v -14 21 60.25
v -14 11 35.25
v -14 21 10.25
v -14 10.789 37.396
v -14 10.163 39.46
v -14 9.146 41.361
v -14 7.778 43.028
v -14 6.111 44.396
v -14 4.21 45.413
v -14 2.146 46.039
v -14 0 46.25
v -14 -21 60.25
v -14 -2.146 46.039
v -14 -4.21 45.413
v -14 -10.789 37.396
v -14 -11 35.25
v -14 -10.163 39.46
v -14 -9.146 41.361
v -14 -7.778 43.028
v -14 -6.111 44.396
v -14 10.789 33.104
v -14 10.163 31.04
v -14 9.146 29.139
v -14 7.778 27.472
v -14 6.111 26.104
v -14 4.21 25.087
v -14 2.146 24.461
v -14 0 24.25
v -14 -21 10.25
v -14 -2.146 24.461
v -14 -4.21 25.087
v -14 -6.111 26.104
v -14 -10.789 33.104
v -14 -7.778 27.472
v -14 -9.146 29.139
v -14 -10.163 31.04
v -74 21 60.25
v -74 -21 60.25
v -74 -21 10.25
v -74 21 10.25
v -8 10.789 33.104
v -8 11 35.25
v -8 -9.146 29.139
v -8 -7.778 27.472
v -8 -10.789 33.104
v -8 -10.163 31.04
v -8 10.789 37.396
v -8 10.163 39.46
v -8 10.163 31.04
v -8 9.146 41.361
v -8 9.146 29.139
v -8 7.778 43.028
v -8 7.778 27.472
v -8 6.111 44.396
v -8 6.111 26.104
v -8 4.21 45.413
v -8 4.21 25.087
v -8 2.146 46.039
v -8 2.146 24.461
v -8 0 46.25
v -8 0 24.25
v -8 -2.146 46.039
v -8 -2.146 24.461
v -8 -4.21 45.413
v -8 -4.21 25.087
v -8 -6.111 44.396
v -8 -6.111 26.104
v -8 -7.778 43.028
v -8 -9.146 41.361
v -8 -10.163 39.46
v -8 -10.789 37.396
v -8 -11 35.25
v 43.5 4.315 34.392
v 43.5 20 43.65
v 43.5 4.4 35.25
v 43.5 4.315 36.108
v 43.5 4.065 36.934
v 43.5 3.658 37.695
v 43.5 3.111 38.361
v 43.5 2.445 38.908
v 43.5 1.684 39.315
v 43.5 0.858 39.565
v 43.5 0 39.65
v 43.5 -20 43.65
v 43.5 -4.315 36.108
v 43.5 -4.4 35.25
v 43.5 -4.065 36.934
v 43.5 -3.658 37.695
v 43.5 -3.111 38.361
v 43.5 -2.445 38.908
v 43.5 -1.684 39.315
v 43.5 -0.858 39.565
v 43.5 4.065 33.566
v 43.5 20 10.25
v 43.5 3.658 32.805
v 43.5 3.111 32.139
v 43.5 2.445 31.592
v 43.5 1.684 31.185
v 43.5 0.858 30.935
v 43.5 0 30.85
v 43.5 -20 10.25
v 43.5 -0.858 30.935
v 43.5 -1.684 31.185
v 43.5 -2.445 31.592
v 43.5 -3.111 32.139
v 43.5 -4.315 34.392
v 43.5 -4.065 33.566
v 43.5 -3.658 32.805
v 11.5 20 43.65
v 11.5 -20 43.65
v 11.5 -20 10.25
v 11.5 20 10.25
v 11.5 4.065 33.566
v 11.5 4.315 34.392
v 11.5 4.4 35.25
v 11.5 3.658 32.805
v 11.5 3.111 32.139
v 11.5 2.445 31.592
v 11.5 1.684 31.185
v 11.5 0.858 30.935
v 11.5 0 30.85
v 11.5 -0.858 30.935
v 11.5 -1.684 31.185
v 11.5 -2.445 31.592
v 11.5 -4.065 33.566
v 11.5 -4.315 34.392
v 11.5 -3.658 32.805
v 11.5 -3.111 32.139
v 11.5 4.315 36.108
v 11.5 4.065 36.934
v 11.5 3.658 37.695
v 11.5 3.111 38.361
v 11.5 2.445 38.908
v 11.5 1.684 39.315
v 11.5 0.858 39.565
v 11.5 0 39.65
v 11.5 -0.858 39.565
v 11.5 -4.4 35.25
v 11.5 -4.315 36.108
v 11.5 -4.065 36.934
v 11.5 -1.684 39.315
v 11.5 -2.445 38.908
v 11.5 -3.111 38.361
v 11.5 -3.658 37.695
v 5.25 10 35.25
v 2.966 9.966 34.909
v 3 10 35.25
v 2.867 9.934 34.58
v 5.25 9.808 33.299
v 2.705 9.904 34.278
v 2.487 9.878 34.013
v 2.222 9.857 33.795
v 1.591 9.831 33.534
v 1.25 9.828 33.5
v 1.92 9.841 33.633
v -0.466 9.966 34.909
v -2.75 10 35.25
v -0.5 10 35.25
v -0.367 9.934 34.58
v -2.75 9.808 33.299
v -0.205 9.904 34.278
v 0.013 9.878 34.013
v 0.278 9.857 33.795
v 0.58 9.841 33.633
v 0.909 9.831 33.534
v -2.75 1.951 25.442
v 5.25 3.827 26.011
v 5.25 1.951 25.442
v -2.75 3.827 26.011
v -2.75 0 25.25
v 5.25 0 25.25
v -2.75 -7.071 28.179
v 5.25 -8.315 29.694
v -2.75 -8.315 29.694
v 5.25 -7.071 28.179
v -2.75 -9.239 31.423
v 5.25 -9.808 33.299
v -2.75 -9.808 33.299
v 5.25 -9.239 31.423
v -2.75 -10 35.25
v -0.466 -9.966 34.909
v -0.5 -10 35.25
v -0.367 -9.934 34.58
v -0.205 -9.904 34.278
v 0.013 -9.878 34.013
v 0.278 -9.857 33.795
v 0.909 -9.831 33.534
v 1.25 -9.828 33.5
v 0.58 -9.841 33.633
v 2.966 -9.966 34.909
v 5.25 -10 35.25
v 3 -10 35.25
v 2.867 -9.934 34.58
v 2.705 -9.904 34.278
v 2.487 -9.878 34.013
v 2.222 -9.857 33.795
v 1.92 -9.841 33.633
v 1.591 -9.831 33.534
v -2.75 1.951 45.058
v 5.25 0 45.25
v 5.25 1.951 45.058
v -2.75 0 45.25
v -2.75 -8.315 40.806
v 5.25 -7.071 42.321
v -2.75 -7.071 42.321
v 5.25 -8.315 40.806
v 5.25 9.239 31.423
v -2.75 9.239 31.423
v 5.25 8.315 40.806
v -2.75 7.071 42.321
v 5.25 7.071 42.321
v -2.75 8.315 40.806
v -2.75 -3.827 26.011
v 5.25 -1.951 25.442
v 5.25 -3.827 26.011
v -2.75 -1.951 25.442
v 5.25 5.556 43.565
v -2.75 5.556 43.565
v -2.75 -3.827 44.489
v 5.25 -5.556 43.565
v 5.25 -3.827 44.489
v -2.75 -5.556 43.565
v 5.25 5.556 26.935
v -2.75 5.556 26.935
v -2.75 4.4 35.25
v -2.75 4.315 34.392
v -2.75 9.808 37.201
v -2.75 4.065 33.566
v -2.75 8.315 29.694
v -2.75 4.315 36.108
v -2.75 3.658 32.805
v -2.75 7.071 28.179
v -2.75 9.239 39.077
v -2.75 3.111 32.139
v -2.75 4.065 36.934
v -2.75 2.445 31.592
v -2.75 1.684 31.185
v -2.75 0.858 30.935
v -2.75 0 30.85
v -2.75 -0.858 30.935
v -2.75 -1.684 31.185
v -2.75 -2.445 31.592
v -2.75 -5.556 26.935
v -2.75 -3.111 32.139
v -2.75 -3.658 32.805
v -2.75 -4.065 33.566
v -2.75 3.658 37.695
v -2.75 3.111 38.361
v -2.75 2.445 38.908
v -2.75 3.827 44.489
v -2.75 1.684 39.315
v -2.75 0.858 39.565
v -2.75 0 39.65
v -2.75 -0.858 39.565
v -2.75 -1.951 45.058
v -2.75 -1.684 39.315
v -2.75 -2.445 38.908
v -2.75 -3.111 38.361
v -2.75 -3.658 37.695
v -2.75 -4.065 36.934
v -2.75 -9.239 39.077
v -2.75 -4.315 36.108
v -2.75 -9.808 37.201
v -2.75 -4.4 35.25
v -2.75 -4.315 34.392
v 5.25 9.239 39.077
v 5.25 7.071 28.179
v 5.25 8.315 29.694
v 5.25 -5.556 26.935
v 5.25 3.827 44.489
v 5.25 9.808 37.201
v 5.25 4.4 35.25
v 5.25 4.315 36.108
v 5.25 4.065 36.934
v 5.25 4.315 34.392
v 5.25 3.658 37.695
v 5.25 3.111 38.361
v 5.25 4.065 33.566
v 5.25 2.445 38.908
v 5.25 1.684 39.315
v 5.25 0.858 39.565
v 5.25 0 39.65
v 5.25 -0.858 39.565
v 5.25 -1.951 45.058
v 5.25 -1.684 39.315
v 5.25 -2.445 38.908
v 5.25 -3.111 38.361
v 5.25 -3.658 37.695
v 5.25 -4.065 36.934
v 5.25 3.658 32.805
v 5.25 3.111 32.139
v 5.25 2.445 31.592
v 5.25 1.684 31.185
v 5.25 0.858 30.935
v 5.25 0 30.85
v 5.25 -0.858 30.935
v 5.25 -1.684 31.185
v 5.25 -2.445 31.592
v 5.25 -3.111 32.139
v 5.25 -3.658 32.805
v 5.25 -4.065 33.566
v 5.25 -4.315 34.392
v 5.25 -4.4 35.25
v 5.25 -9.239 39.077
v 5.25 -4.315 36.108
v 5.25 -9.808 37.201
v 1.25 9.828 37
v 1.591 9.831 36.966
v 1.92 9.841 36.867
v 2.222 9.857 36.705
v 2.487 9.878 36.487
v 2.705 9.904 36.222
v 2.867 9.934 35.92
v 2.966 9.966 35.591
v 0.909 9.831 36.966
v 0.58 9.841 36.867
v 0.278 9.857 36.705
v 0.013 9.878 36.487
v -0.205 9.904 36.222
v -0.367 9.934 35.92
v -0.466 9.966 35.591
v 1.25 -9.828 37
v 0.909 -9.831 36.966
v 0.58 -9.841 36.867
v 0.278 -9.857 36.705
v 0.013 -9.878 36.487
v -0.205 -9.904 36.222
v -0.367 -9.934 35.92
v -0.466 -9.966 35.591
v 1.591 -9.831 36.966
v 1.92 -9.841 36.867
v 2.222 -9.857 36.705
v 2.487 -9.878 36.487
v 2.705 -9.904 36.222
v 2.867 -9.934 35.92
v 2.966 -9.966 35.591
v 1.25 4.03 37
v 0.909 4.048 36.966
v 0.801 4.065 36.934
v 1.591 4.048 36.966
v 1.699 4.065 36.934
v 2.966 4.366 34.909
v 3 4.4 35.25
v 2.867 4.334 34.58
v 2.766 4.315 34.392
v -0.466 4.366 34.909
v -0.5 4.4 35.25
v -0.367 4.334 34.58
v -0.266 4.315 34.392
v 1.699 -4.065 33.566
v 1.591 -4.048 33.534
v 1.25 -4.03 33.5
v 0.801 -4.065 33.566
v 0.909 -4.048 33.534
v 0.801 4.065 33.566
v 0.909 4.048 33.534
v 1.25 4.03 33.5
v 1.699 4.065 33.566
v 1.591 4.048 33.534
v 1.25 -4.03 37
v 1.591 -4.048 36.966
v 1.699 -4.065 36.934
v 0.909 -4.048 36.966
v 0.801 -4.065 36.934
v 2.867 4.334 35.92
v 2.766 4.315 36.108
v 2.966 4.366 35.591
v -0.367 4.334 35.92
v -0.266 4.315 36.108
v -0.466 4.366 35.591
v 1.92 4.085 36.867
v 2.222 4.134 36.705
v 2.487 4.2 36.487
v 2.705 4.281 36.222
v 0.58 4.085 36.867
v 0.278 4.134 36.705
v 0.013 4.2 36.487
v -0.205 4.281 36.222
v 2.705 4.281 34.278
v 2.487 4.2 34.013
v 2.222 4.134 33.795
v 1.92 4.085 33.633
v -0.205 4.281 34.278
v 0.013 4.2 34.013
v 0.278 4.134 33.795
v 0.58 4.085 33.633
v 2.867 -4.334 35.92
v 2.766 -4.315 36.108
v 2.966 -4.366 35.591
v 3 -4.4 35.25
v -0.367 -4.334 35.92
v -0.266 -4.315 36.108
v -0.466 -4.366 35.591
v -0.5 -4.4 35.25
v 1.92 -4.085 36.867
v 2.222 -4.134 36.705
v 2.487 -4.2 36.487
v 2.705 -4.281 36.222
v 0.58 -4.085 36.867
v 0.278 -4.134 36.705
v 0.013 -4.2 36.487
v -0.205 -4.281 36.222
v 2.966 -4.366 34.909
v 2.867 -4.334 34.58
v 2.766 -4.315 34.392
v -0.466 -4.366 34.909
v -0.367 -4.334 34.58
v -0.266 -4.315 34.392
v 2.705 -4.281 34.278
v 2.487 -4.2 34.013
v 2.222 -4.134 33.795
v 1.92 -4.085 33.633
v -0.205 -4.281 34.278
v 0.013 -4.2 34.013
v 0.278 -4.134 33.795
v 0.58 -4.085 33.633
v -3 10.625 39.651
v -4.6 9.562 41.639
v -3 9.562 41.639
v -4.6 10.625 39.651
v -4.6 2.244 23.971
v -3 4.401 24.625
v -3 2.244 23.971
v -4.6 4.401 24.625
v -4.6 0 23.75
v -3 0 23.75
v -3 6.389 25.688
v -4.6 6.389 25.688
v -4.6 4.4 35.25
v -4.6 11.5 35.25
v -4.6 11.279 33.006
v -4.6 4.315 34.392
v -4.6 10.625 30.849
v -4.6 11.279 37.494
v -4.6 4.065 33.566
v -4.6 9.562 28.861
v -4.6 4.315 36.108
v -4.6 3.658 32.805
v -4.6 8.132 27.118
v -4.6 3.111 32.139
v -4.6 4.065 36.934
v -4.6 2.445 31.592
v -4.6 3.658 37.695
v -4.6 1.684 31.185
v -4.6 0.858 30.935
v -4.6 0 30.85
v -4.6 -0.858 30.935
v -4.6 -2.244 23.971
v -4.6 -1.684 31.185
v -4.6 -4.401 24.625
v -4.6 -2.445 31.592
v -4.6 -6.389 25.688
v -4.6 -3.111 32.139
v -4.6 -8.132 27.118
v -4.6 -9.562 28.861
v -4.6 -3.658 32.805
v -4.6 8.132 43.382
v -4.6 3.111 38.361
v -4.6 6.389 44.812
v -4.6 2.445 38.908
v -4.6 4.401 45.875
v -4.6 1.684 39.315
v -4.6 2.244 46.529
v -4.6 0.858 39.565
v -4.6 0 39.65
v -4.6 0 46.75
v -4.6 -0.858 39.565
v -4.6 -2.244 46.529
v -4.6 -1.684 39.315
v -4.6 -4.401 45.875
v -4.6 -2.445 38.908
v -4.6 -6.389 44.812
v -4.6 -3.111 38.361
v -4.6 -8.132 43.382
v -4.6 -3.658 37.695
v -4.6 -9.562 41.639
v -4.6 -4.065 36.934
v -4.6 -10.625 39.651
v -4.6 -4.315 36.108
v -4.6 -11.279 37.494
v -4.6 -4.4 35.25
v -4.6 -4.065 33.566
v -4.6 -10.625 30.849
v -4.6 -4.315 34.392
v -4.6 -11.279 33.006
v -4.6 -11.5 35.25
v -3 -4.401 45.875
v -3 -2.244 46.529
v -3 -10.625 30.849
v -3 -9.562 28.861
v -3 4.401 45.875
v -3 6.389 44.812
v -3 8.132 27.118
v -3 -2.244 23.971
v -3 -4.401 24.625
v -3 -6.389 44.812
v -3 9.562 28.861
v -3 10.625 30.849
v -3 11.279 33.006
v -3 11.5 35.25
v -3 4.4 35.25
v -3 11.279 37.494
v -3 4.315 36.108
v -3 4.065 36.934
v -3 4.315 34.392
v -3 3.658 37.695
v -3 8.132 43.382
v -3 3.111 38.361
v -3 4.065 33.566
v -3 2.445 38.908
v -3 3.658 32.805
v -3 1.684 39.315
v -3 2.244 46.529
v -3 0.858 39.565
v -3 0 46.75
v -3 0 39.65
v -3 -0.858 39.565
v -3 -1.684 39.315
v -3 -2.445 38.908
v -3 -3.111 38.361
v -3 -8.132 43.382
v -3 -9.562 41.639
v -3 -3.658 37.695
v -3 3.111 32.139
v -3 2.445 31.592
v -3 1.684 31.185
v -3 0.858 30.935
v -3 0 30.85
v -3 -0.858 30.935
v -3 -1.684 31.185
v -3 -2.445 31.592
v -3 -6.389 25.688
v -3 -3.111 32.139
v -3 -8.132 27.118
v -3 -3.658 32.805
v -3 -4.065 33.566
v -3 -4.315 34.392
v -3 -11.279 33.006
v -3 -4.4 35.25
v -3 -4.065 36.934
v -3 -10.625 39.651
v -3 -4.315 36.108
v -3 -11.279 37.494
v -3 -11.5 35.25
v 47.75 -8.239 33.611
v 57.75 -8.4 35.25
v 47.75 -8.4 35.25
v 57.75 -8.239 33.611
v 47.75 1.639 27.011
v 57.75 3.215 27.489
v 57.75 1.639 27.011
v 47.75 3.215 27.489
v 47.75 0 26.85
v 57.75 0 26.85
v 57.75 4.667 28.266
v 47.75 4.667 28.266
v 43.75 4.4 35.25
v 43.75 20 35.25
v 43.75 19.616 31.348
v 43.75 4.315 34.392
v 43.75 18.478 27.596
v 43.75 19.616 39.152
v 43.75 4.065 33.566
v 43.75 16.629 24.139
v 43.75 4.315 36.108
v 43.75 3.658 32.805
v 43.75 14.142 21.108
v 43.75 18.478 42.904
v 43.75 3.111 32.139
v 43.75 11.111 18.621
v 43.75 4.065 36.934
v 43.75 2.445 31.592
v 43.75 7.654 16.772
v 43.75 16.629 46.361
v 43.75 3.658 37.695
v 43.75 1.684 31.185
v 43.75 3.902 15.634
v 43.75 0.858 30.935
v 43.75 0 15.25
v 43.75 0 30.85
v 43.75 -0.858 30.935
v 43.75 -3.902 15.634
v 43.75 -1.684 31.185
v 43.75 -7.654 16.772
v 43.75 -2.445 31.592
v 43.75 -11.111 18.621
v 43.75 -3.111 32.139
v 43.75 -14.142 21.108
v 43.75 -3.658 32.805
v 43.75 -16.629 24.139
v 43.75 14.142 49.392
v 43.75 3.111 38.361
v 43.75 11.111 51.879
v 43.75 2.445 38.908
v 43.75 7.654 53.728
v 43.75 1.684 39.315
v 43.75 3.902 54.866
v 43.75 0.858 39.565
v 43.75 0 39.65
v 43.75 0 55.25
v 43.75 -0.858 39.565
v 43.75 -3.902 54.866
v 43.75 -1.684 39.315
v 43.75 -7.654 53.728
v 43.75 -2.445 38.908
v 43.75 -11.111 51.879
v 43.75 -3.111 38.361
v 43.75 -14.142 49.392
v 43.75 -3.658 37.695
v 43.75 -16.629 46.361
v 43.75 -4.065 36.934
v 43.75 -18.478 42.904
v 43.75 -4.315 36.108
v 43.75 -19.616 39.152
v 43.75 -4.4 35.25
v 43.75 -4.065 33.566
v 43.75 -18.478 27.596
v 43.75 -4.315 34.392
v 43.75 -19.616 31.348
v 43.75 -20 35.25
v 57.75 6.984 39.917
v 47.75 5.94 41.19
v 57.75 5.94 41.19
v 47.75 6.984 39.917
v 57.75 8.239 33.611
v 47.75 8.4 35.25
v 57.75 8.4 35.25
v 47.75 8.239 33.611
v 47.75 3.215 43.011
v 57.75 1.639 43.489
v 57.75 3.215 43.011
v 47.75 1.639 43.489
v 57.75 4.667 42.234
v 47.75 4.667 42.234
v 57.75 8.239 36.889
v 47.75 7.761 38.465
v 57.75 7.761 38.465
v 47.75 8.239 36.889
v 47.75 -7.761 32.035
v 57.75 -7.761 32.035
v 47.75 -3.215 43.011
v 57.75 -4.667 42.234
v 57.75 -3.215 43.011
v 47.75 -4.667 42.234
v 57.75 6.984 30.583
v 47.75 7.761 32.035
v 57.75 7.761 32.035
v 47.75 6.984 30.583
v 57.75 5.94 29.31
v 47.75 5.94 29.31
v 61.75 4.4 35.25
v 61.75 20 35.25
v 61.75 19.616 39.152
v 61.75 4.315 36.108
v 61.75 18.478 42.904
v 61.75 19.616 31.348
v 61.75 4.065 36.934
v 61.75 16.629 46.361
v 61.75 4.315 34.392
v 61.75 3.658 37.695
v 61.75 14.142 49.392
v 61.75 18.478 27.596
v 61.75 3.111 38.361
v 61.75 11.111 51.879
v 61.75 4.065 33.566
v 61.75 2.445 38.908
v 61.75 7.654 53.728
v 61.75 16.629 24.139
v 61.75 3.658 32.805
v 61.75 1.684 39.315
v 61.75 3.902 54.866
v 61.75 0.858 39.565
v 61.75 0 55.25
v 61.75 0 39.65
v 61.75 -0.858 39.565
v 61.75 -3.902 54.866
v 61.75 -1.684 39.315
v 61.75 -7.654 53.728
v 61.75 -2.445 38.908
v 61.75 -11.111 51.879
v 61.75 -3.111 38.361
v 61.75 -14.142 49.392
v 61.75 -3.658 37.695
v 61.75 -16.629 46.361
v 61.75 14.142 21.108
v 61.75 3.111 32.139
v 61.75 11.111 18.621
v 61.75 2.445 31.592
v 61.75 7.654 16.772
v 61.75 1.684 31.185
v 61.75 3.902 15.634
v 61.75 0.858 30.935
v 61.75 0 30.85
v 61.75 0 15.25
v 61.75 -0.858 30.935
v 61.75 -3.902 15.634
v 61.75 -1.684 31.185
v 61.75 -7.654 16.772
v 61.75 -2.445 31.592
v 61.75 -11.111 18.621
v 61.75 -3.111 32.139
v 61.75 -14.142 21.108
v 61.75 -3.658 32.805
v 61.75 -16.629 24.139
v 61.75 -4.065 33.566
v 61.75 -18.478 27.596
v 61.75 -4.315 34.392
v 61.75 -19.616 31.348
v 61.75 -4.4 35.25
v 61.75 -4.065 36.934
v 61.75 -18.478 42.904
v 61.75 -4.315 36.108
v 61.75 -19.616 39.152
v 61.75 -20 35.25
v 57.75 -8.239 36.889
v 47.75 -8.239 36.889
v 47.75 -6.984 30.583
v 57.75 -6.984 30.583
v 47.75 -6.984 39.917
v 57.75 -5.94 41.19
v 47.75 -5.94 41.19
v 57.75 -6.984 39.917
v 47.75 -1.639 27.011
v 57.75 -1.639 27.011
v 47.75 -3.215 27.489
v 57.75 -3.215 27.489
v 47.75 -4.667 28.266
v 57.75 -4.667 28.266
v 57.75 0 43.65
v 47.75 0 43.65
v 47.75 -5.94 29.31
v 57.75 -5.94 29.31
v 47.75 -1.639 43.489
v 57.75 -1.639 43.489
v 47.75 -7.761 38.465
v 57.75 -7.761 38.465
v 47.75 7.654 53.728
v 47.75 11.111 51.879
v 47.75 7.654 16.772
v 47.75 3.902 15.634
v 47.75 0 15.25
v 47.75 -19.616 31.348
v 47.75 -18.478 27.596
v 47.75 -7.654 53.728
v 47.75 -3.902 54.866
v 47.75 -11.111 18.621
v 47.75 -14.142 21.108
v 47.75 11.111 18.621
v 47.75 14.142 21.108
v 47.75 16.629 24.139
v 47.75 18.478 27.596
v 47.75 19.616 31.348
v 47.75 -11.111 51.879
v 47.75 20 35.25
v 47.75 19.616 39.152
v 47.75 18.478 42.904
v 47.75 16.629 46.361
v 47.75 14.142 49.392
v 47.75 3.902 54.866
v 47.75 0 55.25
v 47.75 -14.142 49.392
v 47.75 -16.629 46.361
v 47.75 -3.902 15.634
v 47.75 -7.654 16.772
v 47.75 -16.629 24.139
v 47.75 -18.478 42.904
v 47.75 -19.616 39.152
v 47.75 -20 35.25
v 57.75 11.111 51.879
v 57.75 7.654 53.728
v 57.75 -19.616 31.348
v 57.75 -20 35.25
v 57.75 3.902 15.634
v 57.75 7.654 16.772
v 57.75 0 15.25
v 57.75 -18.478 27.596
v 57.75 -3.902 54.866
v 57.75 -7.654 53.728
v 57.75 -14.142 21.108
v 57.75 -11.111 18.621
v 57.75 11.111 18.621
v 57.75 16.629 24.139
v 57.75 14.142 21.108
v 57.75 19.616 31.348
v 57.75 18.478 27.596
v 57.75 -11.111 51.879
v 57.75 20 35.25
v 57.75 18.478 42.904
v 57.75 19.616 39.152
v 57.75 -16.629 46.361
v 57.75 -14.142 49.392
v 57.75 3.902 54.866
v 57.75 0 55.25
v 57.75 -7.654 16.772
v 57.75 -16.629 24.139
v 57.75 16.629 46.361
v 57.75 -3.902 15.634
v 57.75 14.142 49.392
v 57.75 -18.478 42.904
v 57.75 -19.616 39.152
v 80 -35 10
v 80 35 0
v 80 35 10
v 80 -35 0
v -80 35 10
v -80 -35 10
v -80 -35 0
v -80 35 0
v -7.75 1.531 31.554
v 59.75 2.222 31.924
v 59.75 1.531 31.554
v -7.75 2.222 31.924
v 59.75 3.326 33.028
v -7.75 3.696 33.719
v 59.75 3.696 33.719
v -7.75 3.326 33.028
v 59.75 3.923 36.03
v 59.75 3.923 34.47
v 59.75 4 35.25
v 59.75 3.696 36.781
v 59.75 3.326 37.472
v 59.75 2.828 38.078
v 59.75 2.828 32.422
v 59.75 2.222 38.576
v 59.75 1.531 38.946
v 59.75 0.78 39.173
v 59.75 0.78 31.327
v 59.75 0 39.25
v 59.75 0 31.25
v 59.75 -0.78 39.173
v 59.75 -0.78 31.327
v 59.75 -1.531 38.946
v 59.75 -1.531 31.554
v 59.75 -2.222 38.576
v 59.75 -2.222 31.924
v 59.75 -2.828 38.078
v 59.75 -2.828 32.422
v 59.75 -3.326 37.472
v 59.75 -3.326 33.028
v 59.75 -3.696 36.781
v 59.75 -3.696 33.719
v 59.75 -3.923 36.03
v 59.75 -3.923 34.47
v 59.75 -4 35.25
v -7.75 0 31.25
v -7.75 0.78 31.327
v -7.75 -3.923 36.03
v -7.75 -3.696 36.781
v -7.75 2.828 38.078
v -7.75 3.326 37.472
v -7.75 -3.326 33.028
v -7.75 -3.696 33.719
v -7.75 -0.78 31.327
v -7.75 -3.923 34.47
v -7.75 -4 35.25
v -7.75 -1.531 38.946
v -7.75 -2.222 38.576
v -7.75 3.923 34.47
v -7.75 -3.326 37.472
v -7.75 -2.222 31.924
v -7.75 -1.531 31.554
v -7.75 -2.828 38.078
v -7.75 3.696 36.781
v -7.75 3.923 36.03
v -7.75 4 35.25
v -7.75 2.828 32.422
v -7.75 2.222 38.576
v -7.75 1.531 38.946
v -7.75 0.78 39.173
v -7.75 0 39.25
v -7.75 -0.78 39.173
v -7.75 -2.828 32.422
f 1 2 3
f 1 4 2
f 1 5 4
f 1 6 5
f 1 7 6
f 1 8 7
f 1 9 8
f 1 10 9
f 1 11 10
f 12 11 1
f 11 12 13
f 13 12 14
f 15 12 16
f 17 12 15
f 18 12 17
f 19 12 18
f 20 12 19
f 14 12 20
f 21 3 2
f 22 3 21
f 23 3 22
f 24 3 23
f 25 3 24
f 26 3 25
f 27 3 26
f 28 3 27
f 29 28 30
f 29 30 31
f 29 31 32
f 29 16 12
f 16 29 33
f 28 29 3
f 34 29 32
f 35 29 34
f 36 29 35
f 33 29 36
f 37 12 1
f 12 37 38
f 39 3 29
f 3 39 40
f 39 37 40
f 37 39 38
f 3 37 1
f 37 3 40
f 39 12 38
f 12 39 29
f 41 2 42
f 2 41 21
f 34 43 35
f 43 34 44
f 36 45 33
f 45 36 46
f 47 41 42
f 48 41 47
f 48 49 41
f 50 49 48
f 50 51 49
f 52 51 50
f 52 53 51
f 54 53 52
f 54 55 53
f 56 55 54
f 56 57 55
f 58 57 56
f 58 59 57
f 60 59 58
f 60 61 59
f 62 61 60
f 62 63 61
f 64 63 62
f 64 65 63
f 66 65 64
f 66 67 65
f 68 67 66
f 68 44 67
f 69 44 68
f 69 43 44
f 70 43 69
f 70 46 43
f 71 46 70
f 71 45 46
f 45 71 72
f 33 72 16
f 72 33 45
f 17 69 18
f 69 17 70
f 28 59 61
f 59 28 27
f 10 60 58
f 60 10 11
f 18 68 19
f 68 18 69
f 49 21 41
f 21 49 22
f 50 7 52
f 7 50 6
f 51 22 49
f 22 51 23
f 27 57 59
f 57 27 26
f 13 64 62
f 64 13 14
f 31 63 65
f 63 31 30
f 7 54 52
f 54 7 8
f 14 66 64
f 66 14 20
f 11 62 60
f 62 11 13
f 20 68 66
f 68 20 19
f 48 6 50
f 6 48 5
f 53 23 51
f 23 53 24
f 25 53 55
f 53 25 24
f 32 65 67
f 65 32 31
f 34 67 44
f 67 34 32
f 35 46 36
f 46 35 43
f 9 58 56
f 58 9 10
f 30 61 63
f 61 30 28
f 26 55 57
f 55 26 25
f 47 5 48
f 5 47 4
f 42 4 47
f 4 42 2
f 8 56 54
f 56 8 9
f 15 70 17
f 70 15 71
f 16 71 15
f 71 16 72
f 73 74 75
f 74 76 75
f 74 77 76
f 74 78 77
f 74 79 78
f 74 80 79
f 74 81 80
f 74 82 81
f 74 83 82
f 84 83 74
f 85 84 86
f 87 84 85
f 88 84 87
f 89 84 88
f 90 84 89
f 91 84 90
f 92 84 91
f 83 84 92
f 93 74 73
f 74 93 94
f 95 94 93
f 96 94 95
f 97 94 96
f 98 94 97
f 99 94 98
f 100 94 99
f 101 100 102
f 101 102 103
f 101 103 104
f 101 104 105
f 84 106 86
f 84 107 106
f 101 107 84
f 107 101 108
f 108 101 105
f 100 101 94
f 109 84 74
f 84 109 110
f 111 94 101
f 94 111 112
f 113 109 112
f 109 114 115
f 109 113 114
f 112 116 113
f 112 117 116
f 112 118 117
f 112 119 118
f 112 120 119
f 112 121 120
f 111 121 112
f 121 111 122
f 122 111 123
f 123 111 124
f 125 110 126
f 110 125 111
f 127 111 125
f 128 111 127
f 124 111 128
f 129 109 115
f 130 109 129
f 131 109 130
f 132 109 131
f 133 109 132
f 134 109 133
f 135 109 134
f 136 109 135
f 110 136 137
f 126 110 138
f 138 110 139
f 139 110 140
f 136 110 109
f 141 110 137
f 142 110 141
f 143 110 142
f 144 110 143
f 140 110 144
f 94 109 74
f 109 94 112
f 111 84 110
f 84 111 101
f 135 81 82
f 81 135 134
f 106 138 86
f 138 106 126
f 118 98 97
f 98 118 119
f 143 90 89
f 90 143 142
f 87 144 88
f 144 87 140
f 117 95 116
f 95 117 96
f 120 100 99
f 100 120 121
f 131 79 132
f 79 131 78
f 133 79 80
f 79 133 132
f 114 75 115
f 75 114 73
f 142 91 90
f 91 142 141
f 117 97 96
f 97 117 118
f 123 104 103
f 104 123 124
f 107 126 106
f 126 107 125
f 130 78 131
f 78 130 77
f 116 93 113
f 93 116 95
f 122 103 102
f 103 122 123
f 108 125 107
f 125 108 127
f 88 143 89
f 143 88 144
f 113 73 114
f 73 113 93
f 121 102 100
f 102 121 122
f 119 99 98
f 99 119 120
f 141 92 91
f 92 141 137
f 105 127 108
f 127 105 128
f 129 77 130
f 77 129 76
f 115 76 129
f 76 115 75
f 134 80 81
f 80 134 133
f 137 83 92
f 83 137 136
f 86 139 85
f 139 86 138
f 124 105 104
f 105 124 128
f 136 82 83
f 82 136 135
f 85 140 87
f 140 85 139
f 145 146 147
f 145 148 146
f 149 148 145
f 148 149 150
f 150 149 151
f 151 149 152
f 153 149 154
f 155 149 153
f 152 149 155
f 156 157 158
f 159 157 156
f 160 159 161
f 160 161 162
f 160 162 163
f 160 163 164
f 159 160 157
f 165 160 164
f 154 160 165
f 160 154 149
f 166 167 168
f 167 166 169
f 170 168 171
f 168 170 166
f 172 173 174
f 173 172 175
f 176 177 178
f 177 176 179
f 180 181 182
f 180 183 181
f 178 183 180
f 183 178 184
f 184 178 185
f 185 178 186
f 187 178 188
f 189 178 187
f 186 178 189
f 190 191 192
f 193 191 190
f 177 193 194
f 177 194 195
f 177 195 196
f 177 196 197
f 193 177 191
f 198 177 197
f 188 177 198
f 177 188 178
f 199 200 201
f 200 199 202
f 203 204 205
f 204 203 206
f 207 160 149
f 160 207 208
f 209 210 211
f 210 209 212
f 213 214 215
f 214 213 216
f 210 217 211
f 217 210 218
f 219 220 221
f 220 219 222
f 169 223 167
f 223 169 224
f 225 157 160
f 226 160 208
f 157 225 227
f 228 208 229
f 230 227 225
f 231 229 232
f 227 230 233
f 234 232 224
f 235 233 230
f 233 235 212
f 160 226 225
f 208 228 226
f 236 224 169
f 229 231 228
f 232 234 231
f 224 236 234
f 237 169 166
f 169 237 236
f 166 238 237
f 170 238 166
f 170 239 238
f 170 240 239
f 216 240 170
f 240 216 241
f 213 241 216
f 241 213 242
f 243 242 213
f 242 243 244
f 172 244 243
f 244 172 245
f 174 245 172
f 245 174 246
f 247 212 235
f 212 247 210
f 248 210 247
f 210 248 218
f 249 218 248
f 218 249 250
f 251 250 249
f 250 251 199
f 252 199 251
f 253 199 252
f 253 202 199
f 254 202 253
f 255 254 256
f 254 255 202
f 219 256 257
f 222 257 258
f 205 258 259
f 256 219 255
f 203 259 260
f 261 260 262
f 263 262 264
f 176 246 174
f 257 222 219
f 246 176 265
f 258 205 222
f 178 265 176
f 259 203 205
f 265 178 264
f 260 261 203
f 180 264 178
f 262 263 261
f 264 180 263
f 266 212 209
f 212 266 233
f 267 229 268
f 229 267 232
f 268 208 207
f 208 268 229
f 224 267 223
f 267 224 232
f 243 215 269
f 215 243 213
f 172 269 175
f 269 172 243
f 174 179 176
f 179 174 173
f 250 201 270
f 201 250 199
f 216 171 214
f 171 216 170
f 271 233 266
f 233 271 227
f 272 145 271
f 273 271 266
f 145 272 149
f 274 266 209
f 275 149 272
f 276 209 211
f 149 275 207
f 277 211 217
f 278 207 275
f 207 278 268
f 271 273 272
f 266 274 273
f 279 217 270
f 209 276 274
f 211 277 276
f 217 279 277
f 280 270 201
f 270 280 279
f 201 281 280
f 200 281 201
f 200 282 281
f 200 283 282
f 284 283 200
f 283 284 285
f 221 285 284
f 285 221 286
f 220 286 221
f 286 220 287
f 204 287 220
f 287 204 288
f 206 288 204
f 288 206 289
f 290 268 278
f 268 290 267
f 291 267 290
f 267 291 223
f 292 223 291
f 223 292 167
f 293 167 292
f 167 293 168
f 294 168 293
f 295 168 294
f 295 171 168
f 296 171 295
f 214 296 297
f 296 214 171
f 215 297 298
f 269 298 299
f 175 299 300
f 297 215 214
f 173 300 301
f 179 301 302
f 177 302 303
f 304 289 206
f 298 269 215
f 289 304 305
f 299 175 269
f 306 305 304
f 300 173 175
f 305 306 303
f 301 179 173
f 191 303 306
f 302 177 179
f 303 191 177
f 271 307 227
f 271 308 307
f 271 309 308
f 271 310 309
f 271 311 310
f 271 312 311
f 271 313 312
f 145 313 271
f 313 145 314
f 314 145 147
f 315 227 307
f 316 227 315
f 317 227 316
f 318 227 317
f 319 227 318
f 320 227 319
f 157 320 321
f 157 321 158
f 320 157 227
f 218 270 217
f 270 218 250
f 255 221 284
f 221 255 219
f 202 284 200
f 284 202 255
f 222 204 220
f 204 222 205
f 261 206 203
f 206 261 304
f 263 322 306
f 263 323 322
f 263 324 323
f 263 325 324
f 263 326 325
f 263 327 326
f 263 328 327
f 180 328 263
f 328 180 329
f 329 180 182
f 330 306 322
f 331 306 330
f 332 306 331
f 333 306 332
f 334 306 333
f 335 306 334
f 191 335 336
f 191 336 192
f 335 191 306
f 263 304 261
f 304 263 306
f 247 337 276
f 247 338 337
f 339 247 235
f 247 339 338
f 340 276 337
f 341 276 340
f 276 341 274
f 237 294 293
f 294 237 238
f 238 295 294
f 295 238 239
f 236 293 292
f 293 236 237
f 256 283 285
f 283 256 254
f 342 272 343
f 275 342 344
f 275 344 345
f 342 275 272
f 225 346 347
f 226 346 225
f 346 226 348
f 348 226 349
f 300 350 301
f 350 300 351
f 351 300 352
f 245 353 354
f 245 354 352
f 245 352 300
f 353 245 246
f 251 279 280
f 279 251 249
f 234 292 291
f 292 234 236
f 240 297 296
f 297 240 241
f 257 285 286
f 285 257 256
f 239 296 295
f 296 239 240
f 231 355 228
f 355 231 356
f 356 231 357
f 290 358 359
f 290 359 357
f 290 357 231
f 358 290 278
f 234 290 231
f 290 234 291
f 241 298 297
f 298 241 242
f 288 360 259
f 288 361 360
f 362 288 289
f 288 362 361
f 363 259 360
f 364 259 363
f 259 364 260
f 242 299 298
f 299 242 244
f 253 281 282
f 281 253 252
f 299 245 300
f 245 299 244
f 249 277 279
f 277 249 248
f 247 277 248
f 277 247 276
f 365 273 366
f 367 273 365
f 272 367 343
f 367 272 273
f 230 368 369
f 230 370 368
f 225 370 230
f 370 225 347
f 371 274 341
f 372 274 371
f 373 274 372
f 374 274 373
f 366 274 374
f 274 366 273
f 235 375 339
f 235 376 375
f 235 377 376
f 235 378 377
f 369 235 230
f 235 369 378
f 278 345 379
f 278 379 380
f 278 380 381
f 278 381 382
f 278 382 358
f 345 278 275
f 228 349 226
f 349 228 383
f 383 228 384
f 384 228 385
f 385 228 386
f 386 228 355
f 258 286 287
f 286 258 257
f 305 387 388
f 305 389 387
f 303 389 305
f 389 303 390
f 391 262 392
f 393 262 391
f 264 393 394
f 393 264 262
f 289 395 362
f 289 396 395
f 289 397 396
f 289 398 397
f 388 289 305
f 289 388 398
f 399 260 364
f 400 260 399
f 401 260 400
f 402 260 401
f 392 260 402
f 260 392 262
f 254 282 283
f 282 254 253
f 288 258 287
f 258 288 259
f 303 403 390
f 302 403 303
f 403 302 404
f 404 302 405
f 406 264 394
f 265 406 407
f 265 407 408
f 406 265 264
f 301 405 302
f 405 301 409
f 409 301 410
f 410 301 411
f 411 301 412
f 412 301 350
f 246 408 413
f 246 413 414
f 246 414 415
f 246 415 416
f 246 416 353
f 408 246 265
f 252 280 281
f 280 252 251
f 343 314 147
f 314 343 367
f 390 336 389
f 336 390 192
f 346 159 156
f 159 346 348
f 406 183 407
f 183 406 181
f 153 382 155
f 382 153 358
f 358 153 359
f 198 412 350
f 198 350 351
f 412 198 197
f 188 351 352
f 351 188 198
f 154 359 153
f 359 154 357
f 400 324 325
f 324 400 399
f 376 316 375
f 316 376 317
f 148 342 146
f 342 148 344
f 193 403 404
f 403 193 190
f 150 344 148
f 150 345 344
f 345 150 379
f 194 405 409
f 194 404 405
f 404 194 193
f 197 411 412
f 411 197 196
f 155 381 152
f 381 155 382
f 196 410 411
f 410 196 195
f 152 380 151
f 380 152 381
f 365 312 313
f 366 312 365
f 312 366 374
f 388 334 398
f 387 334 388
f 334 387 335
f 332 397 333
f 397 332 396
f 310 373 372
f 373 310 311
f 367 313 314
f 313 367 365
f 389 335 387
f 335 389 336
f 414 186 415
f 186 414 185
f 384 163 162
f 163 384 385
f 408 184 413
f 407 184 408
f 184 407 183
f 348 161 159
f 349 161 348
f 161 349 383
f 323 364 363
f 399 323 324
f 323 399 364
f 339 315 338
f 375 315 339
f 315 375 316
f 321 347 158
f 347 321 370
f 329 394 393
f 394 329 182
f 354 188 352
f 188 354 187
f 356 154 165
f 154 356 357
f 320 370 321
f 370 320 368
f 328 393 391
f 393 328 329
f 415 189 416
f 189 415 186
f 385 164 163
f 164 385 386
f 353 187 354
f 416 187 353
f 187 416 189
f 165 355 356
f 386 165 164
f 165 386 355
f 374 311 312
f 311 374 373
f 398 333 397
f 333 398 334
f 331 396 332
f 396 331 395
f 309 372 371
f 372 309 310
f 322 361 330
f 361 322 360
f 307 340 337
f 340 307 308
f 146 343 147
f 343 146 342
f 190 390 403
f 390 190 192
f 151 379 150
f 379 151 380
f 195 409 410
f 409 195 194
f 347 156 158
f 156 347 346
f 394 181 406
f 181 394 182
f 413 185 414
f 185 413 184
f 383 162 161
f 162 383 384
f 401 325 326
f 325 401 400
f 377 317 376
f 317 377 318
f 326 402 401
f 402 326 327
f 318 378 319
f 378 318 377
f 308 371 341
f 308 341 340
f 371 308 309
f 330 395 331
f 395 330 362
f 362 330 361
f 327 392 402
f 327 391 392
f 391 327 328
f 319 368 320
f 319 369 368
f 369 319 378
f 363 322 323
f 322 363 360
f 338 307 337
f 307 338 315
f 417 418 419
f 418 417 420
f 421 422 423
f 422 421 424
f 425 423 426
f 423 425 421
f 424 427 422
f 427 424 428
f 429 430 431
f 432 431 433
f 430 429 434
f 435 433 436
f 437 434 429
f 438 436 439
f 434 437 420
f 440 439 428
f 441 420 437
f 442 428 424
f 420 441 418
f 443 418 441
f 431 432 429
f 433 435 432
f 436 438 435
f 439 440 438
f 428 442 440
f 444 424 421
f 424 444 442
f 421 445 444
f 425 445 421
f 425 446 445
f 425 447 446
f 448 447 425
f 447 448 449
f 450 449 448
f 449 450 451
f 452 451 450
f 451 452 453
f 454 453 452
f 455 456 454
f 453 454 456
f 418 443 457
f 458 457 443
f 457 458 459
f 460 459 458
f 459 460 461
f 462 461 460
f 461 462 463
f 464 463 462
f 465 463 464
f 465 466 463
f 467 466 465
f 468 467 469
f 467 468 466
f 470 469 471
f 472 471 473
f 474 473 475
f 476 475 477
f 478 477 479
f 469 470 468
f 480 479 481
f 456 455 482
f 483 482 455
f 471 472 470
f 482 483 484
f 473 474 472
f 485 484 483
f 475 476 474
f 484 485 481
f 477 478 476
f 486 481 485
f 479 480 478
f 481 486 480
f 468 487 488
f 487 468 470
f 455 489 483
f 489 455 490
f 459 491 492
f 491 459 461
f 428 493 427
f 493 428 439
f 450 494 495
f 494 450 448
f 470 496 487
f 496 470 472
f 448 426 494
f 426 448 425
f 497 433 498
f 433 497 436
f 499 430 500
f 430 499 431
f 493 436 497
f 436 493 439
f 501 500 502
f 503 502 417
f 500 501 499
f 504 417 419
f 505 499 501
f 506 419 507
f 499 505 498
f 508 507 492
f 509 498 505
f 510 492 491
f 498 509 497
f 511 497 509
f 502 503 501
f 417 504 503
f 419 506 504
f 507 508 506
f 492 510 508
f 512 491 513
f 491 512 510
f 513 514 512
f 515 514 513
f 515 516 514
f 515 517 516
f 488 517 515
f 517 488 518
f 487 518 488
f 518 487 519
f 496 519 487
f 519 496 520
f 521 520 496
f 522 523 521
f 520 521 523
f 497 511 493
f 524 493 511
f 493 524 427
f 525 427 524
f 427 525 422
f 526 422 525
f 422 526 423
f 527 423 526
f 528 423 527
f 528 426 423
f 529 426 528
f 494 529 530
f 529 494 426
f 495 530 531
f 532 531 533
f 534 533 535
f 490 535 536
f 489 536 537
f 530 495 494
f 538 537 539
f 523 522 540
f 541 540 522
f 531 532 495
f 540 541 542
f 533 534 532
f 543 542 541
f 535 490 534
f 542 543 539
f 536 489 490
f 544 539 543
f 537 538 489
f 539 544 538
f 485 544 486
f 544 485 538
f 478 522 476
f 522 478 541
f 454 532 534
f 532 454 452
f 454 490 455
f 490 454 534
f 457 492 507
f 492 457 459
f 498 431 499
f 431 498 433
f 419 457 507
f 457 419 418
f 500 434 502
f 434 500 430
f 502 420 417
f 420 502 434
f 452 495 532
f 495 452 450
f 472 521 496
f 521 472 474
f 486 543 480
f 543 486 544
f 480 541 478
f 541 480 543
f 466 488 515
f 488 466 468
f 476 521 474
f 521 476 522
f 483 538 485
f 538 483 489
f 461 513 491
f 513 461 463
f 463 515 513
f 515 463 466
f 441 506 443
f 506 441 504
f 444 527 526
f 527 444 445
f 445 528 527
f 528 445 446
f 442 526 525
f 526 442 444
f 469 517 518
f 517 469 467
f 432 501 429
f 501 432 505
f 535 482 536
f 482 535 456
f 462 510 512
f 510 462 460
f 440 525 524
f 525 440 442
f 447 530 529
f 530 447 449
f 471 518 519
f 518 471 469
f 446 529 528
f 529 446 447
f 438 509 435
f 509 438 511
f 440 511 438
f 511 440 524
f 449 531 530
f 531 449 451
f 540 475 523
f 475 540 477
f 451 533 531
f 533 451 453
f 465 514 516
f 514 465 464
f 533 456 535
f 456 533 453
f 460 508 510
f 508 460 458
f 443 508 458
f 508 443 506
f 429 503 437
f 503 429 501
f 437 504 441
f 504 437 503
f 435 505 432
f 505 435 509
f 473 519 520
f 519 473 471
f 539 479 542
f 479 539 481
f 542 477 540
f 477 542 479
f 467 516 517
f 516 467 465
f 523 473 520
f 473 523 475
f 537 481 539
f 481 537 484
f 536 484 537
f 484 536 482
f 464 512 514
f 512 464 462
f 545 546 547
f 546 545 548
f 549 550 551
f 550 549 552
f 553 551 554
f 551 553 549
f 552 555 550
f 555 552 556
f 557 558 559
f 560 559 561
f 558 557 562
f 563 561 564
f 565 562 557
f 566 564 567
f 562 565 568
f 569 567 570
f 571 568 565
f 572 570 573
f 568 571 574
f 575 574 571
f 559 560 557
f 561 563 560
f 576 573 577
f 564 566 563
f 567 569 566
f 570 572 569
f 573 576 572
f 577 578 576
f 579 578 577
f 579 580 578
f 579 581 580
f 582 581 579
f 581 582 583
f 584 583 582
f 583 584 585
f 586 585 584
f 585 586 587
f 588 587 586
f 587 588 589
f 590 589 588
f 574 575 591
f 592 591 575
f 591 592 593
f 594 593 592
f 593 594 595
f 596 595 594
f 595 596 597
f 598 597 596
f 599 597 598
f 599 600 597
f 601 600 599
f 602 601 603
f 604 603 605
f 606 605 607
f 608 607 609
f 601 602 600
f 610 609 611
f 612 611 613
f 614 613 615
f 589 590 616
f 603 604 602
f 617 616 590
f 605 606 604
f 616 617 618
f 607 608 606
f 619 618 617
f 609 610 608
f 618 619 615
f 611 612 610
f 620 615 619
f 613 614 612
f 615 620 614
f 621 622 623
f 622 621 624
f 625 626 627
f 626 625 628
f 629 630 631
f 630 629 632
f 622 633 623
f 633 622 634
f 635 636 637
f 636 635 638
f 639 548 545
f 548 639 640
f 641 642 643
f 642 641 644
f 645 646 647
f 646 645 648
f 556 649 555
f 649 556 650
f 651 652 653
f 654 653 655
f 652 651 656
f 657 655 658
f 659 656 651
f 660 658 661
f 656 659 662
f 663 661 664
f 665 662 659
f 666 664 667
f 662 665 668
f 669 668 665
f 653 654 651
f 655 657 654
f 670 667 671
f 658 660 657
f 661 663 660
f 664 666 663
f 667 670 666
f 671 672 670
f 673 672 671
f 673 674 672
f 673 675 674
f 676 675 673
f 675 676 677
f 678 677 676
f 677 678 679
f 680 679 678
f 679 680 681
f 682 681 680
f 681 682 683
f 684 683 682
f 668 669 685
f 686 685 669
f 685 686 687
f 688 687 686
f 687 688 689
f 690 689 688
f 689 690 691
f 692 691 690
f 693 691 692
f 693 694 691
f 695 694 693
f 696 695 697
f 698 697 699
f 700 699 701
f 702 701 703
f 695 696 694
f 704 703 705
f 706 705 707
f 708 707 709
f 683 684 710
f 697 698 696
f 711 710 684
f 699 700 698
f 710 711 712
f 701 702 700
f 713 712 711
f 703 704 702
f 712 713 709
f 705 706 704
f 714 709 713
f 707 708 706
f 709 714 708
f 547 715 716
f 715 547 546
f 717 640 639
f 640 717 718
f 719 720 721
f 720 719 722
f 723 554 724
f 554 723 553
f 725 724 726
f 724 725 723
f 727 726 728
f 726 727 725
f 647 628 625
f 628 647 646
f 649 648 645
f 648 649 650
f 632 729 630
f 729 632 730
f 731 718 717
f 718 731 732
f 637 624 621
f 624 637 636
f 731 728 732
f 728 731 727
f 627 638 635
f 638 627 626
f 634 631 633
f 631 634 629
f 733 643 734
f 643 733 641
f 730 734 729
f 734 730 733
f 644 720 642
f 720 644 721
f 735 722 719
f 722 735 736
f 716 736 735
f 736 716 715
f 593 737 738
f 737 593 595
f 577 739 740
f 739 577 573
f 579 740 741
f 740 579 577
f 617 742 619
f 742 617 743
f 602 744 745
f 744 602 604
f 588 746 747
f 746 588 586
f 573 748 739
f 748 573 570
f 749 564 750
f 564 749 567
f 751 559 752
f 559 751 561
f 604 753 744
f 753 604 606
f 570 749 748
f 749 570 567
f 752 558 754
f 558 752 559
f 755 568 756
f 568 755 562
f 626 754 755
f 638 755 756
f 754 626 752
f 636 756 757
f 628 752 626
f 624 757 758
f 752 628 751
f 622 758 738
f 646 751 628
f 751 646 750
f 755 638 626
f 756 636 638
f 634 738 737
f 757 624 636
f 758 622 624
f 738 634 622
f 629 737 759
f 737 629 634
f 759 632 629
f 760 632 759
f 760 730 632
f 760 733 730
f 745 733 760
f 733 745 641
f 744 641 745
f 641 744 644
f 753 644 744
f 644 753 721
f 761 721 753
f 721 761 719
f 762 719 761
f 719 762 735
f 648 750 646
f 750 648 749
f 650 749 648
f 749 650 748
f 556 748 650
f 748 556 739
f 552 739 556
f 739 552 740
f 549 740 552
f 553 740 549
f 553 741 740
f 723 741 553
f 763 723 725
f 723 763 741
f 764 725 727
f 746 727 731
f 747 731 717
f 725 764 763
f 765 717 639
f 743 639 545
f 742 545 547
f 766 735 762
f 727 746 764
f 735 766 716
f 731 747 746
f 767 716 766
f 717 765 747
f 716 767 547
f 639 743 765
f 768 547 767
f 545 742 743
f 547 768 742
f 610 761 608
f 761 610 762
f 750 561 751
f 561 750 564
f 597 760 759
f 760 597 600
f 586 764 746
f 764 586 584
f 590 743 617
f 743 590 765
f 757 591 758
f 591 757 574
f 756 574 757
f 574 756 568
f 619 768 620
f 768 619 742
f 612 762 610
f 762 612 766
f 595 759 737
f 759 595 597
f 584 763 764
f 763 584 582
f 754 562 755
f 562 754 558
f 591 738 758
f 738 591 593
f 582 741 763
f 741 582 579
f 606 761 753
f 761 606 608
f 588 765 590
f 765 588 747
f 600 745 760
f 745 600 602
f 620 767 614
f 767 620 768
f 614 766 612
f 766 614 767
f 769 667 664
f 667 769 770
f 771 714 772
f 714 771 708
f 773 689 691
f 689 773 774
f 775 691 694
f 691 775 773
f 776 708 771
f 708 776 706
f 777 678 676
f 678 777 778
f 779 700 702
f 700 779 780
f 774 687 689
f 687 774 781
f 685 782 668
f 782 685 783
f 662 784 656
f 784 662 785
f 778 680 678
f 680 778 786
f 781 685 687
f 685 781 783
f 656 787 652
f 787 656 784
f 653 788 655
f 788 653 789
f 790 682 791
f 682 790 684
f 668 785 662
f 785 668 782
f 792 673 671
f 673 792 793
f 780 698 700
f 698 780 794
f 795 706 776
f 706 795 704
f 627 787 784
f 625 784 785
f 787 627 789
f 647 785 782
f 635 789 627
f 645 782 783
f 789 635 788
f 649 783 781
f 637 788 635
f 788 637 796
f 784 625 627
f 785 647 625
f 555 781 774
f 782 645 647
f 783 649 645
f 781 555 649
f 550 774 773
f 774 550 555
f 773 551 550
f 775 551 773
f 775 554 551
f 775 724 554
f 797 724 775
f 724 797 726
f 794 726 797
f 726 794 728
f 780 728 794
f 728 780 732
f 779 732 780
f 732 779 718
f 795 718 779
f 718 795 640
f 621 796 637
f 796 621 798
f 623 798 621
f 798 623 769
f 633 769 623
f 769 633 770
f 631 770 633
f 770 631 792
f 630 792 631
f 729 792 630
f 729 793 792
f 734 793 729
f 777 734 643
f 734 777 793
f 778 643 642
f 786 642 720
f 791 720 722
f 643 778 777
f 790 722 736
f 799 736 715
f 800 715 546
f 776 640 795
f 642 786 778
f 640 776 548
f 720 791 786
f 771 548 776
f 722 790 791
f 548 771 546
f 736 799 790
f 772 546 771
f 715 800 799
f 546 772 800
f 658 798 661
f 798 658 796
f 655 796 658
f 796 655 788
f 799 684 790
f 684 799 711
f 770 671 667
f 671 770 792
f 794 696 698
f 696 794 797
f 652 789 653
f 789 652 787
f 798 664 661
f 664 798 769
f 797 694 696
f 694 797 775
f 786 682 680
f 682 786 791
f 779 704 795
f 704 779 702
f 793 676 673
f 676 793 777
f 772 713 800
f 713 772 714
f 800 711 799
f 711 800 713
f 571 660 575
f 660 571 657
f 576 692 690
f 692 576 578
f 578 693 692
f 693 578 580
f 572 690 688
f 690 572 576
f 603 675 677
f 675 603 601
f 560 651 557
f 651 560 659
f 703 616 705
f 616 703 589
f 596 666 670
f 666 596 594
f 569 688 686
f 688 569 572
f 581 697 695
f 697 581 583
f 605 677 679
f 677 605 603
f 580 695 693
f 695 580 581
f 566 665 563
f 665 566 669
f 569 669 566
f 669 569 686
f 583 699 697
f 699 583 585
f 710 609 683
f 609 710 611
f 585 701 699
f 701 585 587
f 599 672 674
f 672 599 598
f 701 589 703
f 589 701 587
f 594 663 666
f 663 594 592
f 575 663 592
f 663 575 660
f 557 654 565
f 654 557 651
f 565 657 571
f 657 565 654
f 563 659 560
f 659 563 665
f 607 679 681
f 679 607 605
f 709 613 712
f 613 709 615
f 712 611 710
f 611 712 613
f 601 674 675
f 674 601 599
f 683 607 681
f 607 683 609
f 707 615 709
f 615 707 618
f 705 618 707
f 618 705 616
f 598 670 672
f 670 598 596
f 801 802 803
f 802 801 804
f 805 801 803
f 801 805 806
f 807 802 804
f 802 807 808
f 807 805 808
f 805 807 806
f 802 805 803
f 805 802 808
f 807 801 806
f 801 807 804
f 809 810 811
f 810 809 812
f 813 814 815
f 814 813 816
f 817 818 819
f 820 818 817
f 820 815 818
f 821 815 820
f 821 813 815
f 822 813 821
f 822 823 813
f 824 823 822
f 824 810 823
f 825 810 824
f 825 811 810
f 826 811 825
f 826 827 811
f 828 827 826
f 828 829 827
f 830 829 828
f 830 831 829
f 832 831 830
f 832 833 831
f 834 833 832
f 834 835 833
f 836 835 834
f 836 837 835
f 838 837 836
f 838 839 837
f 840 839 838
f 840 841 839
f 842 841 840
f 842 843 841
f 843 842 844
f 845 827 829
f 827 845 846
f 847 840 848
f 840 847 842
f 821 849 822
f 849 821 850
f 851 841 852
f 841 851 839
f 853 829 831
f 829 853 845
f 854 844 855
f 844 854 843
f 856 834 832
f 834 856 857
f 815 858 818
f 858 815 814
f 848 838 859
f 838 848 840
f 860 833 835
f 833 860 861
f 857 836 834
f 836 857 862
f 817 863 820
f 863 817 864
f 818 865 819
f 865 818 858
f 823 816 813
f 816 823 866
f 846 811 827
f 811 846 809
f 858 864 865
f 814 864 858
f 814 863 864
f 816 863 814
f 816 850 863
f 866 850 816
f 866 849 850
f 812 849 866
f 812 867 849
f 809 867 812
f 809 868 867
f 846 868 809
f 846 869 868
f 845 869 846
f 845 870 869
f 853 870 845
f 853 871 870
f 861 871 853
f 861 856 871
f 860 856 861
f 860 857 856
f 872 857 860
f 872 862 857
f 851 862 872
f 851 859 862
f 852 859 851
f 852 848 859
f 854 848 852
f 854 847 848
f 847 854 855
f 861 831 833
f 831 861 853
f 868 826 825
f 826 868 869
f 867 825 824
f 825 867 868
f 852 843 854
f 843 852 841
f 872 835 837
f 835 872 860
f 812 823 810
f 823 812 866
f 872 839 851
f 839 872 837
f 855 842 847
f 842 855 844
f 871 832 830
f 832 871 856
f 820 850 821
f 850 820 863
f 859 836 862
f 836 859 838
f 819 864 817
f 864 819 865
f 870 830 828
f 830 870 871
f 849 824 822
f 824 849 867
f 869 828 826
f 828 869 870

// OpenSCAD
$fn = 32;

// ------------------------------------------------------------------------
// Motor drive station: motor 60 x 50 mm, shaft d8, pulley d40
// Every part is its own module, assembly() places every instance.
// ------------------------------------------------------------------------

// --- part 1 ---
module station_bed() {
  difference() {
    translate([-80, -35, 0]) cube([160, 70, 10]);
  }
}

// --- part 2 ---
module drive_motor() {
  union() {
    translate([-30, -21, 0]) cube([60, 42, 50]);
    translate([33, 0, 25]) rotate([0, 90, 0]) cylinder(h = 6, d = 22, center = true);
  }
}

// --- part 3 ---
module pillow_block() {
  difference() {
    translate([-16, -20, 0]) cube([32, 40, 33.4]);
    translate([0, 0, 25]) rotate([0, 90, 0]) cylinder(h = 34, d = 8.8, center = true);
  }
}

// --- part 4 ---
module drive_shaft() {
  translate([0, 0, -33.75]) cylinder(h = 67.5, d = 8);
}

// --- part 5 ---
module shaft_collar() {
  difference() {
    cylinder(h = 8, d = 20);
    translate([0, 0, -1]) cylinder(h = 10, d = 8.8);
    translate([0, 0, 4]) rotate([90, 0, 0]) cylinder(h = 22, d = 3.5, center = true);
  }
}

// --- part 6 ---
module collar_washer() {
  difference() {
      translate([0, 0, 0]) cylinder(h = 1.6, d = 23);
      translate([0, 0, -1]) cylinder(h = 3.6, d = 8.8);
    }
}

// --- part 7 ---
module drive_pulley() {
  difference() {
    union() {
      cylinder(h = 18, d = 16.8);
      cylinder(h = 4, d = 40);
      translate([0, 0, 14]) cylinder(h = 4, d = 40);
    }
    translate([0, 0, -1]) cylinder(h = 20, d = 8.8);
  }
}

// --- assembly ---
module assembly() {
  color([0.80, 0.24, 0.20]) translate([0, 0, 0]) rotate([0, 0, 0]) station_bed();
  color([0.20, 0.45, 0.75]) translate([-44, 0, 10.25]) rotate([0, 0, 0]) drive_motor();
  color([0.25, 0.62, 0.32]) translate([27.5, 0, 10.25]) rotate([0, 0, 0]) pillow_block();
  color([0.92, 0.70, 0.18]) translate([26, 0, 35.25]) rotate([0, 90, 0]) drive_shaft();
  color([0.58, 0.35, 0.70]) translate([-2.75, 0, 35.25]) rotate([0, 90, 0]) shaft_collar();
  color([0.16, 0.66, 0.66]) translate([-4.6, 0, 35.25]) rotate([0, 90, 0]) collar_washer();
  color([0.85, 0.48, 0.18]) translate([43.75, 0, 35.25]) rotate([0, 90, 0]) drive_pulley();
}

assembly();
